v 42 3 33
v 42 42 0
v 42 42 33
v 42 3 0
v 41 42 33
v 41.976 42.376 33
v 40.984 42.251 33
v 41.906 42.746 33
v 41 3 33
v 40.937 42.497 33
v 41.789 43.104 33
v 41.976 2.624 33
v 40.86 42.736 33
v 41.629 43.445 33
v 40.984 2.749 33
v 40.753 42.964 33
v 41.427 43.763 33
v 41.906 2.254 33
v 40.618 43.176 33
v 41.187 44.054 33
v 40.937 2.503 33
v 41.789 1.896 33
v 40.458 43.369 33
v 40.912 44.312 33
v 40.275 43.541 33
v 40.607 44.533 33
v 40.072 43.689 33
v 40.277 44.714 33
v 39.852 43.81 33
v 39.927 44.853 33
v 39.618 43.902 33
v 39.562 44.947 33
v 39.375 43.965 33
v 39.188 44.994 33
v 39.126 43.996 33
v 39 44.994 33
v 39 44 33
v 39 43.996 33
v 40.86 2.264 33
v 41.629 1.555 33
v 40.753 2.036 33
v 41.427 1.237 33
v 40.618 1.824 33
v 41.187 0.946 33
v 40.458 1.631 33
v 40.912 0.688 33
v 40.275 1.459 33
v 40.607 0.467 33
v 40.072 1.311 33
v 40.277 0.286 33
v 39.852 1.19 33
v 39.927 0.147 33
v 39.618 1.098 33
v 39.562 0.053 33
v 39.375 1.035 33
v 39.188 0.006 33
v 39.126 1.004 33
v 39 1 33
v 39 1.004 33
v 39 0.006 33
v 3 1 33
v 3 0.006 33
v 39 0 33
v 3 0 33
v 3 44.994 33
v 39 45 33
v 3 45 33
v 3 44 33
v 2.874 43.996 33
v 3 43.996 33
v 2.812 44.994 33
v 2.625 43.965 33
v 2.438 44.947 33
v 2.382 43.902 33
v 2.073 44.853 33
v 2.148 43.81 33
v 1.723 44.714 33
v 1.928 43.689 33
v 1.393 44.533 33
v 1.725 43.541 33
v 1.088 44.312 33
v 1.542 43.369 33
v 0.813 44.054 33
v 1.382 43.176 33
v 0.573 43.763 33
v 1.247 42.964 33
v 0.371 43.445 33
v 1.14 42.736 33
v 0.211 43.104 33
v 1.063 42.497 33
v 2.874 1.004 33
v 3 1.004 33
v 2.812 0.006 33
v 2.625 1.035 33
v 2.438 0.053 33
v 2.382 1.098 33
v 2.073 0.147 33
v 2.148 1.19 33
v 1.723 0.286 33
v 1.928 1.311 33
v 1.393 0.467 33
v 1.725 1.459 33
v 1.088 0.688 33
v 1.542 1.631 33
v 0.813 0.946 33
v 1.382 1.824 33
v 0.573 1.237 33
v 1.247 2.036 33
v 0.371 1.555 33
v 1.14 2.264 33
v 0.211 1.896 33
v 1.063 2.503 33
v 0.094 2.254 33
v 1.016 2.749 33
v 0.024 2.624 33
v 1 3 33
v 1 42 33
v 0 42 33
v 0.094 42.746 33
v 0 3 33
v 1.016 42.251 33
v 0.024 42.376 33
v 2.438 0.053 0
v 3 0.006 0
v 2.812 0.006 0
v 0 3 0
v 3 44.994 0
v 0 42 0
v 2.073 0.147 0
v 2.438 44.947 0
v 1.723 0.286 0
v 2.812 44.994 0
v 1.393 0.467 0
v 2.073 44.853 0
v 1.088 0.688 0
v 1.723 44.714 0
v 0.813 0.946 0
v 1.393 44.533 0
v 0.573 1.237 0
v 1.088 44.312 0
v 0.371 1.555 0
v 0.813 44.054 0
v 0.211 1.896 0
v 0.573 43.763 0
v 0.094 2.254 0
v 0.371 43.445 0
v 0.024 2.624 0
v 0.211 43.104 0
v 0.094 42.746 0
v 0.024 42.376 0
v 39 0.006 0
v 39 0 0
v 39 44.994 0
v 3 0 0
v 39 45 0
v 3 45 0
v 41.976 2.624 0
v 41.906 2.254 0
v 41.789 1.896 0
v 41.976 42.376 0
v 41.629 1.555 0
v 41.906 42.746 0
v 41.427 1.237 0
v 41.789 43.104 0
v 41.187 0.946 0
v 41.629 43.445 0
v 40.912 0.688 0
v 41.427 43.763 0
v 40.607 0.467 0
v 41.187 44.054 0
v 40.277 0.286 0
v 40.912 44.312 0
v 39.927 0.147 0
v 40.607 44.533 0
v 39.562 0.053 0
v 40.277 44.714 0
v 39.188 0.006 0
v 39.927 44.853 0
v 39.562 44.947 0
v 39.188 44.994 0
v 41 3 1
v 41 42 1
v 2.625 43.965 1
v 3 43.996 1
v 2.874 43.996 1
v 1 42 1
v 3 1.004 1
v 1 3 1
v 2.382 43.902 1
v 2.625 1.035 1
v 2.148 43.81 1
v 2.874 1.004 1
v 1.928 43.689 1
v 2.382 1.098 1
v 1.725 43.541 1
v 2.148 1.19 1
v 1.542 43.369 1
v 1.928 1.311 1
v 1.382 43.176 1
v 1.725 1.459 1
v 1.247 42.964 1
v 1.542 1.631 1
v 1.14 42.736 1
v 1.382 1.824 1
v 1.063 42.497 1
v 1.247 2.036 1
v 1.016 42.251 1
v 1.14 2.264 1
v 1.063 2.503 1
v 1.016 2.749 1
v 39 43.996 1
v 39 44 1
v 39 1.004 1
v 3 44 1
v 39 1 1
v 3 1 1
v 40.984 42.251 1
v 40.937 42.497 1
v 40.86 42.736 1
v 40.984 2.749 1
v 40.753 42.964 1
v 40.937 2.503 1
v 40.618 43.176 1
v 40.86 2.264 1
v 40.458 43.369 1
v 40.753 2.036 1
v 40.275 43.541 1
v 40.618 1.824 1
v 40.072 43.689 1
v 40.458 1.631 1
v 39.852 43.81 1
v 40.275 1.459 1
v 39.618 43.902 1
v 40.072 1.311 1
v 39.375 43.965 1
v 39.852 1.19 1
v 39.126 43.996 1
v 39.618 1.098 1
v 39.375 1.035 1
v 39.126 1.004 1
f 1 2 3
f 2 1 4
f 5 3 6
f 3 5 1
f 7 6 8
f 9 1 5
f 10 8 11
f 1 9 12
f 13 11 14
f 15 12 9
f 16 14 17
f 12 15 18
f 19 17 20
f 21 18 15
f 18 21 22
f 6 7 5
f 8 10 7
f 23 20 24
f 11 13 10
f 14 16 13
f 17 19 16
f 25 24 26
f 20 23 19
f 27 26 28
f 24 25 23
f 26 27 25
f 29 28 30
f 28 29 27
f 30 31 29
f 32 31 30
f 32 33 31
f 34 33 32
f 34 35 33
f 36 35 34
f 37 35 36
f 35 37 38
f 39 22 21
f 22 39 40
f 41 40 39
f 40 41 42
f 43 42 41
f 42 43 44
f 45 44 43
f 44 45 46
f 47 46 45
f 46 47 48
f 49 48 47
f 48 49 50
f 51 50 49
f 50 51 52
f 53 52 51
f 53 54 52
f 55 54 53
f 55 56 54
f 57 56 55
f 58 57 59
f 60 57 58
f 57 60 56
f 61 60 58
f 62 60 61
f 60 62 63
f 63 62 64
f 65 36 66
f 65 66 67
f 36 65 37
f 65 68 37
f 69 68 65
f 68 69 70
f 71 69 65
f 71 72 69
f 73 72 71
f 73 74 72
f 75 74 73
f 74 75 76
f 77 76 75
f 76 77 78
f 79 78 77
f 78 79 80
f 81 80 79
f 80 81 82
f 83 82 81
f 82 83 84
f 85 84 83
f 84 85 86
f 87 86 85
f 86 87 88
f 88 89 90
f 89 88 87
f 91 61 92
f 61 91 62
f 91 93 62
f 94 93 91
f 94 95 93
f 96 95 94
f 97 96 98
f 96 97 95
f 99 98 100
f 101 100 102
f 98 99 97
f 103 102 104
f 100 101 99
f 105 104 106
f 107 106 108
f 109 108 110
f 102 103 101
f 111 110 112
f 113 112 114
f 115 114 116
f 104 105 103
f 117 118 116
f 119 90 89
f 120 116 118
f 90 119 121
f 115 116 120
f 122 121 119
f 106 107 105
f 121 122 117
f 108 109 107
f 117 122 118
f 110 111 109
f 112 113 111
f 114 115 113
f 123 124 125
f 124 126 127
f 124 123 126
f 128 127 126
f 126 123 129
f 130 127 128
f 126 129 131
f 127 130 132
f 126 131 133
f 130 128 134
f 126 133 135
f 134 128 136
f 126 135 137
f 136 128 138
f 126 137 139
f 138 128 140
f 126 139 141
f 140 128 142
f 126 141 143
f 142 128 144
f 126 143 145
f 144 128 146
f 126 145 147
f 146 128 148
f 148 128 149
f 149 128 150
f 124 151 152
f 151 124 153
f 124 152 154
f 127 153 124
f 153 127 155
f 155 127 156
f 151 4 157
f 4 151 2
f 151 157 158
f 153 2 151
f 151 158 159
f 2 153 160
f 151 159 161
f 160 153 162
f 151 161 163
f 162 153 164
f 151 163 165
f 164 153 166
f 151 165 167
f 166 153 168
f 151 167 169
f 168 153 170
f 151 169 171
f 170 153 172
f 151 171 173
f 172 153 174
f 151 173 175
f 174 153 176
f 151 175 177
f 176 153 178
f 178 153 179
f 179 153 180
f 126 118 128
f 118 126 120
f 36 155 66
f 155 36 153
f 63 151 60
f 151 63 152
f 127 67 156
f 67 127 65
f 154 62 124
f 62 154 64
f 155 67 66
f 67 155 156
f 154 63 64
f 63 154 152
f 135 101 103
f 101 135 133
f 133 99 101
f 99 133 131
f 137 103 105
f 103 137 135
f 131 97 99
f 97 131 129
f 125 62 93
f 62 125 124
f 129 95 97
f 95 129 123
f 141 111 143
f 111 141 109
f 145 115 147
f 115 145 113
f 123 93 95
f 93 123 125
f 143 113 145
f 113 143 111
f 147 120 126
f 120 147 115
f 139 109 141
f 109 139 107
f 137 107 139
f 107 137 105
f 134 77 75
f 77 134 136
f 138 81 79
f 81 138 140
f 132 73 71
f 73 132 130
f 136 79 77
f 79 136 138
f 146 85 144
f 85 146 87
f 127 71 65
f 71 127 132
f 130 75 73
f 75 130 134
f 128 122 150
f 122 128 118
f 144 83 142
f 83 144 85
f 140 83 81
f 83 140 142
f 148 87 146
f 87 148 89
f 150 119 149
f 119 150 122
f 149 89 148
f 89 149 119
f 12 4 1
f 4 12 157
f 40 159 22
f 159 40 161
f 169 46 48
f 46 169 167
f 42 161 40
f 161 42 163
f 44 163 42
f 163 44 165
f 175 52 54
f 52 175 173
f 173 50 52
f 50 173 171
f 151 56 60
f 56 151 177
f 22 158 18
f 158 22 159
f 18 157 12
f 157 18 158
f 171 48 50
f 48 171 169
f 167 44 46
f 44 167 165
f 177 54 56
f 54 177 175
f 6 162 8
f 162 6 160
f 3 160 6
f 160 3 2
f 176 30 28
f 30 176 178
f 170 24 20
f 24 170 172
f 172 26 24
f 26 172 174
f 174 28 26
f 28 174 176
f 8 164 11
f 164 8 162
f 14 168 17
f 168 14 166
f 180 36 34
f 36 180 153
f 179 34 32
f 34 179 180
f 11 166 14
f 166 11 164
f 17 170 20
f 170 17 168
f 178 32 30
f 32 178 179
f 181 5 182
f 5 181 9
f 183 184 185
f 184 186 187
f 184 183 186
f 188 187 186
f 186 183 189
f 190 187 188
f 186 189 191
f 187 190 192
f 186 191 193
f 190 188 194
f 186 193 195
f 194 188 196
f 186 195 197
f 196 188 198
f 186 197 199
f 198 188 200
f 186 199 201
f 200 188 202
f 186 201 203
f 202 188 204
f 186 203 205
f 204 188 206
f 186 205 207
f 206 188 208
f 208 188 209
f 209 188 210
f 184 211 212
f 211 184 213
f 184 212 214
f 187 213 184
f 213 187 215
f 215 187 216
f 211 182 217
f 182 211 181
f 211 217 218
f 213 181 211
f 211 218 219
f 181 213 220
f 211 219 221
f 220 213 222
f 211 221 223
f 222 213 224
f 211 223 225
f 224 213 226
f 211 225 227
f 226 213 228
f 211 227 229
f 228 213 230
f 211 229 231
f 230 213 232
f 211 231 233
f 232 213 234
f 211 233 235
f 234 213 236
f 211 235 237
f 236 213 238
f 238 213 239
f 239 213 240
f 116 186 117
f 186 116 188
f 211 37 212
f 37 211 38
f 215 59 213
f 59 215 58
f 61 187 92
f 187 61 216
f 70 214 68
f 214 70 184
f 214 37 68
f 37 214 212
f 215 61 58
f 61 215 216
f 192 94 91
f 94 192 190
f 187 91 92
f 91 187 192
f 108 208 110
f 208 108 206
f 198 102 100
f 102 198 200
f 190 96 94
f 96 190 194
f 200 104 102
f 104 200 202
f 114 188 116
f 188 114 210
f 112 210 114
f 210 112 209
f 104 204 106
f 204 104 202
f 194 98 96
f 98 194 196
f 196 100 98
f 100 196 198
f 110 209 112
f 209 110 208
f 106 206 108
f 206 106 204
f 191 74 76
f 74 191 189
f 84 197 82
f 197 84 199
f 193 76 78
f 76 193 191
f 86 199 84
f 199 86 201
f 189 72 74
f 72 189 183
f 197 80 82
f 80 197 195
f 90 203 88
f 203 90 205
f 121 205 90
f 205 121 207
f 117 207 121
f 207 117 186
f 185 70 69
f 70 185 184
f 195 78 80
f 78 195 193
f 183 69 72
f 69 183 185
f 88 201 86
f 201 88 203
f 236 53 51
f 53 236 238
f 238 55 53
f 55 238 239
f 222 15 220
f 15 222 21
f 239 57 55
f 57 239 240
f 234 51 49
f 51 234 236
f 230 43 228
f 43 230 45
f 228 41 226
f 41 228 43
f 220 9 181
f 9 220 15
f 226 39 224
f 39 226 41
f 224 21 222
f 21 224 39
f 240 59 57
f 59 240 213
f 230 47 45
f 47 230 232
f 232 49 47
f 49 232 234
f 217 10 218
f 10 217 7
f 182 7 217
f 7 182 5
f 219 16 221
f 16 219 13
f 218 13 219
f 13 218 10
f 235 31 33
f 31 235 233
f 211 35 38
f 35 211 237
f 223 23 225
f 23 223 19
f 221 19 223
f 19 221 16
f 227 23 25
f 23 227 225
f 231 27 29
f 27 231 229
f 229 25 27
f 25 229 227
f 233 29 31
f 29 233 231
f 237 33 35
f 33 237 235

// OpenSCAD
// Generic storage blocks
// Hussein Suleman
// 28 March 2018

// Height of the box
height = 33;

// Width of the box
width = 42;

// Length of the box
length = 45;

// Wall thickness
wall = 1;

// Floor thickness
floors = 1;

// Corner radius
radius = 3;

// create rounded box with recessed inner surface
module roundbox (w, h, d, rimw, rimr, base)
{
    difference () {
       union () {
          translate ([0,rimr,0]) cube ([w,h-(2*rimr),d]);
          translate ([rimr,0,0]) cube ([w-(2*rimr),h,d]);
          translate ([rimr,rimr,0]) cylinder (r=rimr,h=d,$fn=50);
          translate ([rimr,h-rimr,0]) cylinder (r=rimr,h=d,$fn=50);
          translate ([w-rimr,rimr,0]) cylinder (r=rimr,h=d,$fn=50);
          translate ([w-rimr,h-rimr,0]) cylinder (r=rimr,h=d,$fn=50);
       }
          translate ([rimw,rimr,base]) cube ([w-(2*rimw),h-(2*rimr),d-base+1]);
          translate ([rimr,rimw,base]) cube ([w-(2*rimr),h-(2*rimw),d-base+1]);
          translate ([rimr,rimr,base]) cylinder (r=rimr-rimw,h=d-base+1,$fn=50);
          translate ([rimr,h-rimr,base]) cylinder (r=rimr-rimw,h=d-base+1,$fn=50);
          translate ([w-rimr,rimr,base]) cylinder (r=rimr-rimw,h=d-base+1,$fn=50);
          translate ([w-rimr,h-rimr,base]) cylinder (r=rimr-rimw,h=d-base+1,$fn=50);
       
    }
}

roundbox (width, length, height, wall, radius, floors);
